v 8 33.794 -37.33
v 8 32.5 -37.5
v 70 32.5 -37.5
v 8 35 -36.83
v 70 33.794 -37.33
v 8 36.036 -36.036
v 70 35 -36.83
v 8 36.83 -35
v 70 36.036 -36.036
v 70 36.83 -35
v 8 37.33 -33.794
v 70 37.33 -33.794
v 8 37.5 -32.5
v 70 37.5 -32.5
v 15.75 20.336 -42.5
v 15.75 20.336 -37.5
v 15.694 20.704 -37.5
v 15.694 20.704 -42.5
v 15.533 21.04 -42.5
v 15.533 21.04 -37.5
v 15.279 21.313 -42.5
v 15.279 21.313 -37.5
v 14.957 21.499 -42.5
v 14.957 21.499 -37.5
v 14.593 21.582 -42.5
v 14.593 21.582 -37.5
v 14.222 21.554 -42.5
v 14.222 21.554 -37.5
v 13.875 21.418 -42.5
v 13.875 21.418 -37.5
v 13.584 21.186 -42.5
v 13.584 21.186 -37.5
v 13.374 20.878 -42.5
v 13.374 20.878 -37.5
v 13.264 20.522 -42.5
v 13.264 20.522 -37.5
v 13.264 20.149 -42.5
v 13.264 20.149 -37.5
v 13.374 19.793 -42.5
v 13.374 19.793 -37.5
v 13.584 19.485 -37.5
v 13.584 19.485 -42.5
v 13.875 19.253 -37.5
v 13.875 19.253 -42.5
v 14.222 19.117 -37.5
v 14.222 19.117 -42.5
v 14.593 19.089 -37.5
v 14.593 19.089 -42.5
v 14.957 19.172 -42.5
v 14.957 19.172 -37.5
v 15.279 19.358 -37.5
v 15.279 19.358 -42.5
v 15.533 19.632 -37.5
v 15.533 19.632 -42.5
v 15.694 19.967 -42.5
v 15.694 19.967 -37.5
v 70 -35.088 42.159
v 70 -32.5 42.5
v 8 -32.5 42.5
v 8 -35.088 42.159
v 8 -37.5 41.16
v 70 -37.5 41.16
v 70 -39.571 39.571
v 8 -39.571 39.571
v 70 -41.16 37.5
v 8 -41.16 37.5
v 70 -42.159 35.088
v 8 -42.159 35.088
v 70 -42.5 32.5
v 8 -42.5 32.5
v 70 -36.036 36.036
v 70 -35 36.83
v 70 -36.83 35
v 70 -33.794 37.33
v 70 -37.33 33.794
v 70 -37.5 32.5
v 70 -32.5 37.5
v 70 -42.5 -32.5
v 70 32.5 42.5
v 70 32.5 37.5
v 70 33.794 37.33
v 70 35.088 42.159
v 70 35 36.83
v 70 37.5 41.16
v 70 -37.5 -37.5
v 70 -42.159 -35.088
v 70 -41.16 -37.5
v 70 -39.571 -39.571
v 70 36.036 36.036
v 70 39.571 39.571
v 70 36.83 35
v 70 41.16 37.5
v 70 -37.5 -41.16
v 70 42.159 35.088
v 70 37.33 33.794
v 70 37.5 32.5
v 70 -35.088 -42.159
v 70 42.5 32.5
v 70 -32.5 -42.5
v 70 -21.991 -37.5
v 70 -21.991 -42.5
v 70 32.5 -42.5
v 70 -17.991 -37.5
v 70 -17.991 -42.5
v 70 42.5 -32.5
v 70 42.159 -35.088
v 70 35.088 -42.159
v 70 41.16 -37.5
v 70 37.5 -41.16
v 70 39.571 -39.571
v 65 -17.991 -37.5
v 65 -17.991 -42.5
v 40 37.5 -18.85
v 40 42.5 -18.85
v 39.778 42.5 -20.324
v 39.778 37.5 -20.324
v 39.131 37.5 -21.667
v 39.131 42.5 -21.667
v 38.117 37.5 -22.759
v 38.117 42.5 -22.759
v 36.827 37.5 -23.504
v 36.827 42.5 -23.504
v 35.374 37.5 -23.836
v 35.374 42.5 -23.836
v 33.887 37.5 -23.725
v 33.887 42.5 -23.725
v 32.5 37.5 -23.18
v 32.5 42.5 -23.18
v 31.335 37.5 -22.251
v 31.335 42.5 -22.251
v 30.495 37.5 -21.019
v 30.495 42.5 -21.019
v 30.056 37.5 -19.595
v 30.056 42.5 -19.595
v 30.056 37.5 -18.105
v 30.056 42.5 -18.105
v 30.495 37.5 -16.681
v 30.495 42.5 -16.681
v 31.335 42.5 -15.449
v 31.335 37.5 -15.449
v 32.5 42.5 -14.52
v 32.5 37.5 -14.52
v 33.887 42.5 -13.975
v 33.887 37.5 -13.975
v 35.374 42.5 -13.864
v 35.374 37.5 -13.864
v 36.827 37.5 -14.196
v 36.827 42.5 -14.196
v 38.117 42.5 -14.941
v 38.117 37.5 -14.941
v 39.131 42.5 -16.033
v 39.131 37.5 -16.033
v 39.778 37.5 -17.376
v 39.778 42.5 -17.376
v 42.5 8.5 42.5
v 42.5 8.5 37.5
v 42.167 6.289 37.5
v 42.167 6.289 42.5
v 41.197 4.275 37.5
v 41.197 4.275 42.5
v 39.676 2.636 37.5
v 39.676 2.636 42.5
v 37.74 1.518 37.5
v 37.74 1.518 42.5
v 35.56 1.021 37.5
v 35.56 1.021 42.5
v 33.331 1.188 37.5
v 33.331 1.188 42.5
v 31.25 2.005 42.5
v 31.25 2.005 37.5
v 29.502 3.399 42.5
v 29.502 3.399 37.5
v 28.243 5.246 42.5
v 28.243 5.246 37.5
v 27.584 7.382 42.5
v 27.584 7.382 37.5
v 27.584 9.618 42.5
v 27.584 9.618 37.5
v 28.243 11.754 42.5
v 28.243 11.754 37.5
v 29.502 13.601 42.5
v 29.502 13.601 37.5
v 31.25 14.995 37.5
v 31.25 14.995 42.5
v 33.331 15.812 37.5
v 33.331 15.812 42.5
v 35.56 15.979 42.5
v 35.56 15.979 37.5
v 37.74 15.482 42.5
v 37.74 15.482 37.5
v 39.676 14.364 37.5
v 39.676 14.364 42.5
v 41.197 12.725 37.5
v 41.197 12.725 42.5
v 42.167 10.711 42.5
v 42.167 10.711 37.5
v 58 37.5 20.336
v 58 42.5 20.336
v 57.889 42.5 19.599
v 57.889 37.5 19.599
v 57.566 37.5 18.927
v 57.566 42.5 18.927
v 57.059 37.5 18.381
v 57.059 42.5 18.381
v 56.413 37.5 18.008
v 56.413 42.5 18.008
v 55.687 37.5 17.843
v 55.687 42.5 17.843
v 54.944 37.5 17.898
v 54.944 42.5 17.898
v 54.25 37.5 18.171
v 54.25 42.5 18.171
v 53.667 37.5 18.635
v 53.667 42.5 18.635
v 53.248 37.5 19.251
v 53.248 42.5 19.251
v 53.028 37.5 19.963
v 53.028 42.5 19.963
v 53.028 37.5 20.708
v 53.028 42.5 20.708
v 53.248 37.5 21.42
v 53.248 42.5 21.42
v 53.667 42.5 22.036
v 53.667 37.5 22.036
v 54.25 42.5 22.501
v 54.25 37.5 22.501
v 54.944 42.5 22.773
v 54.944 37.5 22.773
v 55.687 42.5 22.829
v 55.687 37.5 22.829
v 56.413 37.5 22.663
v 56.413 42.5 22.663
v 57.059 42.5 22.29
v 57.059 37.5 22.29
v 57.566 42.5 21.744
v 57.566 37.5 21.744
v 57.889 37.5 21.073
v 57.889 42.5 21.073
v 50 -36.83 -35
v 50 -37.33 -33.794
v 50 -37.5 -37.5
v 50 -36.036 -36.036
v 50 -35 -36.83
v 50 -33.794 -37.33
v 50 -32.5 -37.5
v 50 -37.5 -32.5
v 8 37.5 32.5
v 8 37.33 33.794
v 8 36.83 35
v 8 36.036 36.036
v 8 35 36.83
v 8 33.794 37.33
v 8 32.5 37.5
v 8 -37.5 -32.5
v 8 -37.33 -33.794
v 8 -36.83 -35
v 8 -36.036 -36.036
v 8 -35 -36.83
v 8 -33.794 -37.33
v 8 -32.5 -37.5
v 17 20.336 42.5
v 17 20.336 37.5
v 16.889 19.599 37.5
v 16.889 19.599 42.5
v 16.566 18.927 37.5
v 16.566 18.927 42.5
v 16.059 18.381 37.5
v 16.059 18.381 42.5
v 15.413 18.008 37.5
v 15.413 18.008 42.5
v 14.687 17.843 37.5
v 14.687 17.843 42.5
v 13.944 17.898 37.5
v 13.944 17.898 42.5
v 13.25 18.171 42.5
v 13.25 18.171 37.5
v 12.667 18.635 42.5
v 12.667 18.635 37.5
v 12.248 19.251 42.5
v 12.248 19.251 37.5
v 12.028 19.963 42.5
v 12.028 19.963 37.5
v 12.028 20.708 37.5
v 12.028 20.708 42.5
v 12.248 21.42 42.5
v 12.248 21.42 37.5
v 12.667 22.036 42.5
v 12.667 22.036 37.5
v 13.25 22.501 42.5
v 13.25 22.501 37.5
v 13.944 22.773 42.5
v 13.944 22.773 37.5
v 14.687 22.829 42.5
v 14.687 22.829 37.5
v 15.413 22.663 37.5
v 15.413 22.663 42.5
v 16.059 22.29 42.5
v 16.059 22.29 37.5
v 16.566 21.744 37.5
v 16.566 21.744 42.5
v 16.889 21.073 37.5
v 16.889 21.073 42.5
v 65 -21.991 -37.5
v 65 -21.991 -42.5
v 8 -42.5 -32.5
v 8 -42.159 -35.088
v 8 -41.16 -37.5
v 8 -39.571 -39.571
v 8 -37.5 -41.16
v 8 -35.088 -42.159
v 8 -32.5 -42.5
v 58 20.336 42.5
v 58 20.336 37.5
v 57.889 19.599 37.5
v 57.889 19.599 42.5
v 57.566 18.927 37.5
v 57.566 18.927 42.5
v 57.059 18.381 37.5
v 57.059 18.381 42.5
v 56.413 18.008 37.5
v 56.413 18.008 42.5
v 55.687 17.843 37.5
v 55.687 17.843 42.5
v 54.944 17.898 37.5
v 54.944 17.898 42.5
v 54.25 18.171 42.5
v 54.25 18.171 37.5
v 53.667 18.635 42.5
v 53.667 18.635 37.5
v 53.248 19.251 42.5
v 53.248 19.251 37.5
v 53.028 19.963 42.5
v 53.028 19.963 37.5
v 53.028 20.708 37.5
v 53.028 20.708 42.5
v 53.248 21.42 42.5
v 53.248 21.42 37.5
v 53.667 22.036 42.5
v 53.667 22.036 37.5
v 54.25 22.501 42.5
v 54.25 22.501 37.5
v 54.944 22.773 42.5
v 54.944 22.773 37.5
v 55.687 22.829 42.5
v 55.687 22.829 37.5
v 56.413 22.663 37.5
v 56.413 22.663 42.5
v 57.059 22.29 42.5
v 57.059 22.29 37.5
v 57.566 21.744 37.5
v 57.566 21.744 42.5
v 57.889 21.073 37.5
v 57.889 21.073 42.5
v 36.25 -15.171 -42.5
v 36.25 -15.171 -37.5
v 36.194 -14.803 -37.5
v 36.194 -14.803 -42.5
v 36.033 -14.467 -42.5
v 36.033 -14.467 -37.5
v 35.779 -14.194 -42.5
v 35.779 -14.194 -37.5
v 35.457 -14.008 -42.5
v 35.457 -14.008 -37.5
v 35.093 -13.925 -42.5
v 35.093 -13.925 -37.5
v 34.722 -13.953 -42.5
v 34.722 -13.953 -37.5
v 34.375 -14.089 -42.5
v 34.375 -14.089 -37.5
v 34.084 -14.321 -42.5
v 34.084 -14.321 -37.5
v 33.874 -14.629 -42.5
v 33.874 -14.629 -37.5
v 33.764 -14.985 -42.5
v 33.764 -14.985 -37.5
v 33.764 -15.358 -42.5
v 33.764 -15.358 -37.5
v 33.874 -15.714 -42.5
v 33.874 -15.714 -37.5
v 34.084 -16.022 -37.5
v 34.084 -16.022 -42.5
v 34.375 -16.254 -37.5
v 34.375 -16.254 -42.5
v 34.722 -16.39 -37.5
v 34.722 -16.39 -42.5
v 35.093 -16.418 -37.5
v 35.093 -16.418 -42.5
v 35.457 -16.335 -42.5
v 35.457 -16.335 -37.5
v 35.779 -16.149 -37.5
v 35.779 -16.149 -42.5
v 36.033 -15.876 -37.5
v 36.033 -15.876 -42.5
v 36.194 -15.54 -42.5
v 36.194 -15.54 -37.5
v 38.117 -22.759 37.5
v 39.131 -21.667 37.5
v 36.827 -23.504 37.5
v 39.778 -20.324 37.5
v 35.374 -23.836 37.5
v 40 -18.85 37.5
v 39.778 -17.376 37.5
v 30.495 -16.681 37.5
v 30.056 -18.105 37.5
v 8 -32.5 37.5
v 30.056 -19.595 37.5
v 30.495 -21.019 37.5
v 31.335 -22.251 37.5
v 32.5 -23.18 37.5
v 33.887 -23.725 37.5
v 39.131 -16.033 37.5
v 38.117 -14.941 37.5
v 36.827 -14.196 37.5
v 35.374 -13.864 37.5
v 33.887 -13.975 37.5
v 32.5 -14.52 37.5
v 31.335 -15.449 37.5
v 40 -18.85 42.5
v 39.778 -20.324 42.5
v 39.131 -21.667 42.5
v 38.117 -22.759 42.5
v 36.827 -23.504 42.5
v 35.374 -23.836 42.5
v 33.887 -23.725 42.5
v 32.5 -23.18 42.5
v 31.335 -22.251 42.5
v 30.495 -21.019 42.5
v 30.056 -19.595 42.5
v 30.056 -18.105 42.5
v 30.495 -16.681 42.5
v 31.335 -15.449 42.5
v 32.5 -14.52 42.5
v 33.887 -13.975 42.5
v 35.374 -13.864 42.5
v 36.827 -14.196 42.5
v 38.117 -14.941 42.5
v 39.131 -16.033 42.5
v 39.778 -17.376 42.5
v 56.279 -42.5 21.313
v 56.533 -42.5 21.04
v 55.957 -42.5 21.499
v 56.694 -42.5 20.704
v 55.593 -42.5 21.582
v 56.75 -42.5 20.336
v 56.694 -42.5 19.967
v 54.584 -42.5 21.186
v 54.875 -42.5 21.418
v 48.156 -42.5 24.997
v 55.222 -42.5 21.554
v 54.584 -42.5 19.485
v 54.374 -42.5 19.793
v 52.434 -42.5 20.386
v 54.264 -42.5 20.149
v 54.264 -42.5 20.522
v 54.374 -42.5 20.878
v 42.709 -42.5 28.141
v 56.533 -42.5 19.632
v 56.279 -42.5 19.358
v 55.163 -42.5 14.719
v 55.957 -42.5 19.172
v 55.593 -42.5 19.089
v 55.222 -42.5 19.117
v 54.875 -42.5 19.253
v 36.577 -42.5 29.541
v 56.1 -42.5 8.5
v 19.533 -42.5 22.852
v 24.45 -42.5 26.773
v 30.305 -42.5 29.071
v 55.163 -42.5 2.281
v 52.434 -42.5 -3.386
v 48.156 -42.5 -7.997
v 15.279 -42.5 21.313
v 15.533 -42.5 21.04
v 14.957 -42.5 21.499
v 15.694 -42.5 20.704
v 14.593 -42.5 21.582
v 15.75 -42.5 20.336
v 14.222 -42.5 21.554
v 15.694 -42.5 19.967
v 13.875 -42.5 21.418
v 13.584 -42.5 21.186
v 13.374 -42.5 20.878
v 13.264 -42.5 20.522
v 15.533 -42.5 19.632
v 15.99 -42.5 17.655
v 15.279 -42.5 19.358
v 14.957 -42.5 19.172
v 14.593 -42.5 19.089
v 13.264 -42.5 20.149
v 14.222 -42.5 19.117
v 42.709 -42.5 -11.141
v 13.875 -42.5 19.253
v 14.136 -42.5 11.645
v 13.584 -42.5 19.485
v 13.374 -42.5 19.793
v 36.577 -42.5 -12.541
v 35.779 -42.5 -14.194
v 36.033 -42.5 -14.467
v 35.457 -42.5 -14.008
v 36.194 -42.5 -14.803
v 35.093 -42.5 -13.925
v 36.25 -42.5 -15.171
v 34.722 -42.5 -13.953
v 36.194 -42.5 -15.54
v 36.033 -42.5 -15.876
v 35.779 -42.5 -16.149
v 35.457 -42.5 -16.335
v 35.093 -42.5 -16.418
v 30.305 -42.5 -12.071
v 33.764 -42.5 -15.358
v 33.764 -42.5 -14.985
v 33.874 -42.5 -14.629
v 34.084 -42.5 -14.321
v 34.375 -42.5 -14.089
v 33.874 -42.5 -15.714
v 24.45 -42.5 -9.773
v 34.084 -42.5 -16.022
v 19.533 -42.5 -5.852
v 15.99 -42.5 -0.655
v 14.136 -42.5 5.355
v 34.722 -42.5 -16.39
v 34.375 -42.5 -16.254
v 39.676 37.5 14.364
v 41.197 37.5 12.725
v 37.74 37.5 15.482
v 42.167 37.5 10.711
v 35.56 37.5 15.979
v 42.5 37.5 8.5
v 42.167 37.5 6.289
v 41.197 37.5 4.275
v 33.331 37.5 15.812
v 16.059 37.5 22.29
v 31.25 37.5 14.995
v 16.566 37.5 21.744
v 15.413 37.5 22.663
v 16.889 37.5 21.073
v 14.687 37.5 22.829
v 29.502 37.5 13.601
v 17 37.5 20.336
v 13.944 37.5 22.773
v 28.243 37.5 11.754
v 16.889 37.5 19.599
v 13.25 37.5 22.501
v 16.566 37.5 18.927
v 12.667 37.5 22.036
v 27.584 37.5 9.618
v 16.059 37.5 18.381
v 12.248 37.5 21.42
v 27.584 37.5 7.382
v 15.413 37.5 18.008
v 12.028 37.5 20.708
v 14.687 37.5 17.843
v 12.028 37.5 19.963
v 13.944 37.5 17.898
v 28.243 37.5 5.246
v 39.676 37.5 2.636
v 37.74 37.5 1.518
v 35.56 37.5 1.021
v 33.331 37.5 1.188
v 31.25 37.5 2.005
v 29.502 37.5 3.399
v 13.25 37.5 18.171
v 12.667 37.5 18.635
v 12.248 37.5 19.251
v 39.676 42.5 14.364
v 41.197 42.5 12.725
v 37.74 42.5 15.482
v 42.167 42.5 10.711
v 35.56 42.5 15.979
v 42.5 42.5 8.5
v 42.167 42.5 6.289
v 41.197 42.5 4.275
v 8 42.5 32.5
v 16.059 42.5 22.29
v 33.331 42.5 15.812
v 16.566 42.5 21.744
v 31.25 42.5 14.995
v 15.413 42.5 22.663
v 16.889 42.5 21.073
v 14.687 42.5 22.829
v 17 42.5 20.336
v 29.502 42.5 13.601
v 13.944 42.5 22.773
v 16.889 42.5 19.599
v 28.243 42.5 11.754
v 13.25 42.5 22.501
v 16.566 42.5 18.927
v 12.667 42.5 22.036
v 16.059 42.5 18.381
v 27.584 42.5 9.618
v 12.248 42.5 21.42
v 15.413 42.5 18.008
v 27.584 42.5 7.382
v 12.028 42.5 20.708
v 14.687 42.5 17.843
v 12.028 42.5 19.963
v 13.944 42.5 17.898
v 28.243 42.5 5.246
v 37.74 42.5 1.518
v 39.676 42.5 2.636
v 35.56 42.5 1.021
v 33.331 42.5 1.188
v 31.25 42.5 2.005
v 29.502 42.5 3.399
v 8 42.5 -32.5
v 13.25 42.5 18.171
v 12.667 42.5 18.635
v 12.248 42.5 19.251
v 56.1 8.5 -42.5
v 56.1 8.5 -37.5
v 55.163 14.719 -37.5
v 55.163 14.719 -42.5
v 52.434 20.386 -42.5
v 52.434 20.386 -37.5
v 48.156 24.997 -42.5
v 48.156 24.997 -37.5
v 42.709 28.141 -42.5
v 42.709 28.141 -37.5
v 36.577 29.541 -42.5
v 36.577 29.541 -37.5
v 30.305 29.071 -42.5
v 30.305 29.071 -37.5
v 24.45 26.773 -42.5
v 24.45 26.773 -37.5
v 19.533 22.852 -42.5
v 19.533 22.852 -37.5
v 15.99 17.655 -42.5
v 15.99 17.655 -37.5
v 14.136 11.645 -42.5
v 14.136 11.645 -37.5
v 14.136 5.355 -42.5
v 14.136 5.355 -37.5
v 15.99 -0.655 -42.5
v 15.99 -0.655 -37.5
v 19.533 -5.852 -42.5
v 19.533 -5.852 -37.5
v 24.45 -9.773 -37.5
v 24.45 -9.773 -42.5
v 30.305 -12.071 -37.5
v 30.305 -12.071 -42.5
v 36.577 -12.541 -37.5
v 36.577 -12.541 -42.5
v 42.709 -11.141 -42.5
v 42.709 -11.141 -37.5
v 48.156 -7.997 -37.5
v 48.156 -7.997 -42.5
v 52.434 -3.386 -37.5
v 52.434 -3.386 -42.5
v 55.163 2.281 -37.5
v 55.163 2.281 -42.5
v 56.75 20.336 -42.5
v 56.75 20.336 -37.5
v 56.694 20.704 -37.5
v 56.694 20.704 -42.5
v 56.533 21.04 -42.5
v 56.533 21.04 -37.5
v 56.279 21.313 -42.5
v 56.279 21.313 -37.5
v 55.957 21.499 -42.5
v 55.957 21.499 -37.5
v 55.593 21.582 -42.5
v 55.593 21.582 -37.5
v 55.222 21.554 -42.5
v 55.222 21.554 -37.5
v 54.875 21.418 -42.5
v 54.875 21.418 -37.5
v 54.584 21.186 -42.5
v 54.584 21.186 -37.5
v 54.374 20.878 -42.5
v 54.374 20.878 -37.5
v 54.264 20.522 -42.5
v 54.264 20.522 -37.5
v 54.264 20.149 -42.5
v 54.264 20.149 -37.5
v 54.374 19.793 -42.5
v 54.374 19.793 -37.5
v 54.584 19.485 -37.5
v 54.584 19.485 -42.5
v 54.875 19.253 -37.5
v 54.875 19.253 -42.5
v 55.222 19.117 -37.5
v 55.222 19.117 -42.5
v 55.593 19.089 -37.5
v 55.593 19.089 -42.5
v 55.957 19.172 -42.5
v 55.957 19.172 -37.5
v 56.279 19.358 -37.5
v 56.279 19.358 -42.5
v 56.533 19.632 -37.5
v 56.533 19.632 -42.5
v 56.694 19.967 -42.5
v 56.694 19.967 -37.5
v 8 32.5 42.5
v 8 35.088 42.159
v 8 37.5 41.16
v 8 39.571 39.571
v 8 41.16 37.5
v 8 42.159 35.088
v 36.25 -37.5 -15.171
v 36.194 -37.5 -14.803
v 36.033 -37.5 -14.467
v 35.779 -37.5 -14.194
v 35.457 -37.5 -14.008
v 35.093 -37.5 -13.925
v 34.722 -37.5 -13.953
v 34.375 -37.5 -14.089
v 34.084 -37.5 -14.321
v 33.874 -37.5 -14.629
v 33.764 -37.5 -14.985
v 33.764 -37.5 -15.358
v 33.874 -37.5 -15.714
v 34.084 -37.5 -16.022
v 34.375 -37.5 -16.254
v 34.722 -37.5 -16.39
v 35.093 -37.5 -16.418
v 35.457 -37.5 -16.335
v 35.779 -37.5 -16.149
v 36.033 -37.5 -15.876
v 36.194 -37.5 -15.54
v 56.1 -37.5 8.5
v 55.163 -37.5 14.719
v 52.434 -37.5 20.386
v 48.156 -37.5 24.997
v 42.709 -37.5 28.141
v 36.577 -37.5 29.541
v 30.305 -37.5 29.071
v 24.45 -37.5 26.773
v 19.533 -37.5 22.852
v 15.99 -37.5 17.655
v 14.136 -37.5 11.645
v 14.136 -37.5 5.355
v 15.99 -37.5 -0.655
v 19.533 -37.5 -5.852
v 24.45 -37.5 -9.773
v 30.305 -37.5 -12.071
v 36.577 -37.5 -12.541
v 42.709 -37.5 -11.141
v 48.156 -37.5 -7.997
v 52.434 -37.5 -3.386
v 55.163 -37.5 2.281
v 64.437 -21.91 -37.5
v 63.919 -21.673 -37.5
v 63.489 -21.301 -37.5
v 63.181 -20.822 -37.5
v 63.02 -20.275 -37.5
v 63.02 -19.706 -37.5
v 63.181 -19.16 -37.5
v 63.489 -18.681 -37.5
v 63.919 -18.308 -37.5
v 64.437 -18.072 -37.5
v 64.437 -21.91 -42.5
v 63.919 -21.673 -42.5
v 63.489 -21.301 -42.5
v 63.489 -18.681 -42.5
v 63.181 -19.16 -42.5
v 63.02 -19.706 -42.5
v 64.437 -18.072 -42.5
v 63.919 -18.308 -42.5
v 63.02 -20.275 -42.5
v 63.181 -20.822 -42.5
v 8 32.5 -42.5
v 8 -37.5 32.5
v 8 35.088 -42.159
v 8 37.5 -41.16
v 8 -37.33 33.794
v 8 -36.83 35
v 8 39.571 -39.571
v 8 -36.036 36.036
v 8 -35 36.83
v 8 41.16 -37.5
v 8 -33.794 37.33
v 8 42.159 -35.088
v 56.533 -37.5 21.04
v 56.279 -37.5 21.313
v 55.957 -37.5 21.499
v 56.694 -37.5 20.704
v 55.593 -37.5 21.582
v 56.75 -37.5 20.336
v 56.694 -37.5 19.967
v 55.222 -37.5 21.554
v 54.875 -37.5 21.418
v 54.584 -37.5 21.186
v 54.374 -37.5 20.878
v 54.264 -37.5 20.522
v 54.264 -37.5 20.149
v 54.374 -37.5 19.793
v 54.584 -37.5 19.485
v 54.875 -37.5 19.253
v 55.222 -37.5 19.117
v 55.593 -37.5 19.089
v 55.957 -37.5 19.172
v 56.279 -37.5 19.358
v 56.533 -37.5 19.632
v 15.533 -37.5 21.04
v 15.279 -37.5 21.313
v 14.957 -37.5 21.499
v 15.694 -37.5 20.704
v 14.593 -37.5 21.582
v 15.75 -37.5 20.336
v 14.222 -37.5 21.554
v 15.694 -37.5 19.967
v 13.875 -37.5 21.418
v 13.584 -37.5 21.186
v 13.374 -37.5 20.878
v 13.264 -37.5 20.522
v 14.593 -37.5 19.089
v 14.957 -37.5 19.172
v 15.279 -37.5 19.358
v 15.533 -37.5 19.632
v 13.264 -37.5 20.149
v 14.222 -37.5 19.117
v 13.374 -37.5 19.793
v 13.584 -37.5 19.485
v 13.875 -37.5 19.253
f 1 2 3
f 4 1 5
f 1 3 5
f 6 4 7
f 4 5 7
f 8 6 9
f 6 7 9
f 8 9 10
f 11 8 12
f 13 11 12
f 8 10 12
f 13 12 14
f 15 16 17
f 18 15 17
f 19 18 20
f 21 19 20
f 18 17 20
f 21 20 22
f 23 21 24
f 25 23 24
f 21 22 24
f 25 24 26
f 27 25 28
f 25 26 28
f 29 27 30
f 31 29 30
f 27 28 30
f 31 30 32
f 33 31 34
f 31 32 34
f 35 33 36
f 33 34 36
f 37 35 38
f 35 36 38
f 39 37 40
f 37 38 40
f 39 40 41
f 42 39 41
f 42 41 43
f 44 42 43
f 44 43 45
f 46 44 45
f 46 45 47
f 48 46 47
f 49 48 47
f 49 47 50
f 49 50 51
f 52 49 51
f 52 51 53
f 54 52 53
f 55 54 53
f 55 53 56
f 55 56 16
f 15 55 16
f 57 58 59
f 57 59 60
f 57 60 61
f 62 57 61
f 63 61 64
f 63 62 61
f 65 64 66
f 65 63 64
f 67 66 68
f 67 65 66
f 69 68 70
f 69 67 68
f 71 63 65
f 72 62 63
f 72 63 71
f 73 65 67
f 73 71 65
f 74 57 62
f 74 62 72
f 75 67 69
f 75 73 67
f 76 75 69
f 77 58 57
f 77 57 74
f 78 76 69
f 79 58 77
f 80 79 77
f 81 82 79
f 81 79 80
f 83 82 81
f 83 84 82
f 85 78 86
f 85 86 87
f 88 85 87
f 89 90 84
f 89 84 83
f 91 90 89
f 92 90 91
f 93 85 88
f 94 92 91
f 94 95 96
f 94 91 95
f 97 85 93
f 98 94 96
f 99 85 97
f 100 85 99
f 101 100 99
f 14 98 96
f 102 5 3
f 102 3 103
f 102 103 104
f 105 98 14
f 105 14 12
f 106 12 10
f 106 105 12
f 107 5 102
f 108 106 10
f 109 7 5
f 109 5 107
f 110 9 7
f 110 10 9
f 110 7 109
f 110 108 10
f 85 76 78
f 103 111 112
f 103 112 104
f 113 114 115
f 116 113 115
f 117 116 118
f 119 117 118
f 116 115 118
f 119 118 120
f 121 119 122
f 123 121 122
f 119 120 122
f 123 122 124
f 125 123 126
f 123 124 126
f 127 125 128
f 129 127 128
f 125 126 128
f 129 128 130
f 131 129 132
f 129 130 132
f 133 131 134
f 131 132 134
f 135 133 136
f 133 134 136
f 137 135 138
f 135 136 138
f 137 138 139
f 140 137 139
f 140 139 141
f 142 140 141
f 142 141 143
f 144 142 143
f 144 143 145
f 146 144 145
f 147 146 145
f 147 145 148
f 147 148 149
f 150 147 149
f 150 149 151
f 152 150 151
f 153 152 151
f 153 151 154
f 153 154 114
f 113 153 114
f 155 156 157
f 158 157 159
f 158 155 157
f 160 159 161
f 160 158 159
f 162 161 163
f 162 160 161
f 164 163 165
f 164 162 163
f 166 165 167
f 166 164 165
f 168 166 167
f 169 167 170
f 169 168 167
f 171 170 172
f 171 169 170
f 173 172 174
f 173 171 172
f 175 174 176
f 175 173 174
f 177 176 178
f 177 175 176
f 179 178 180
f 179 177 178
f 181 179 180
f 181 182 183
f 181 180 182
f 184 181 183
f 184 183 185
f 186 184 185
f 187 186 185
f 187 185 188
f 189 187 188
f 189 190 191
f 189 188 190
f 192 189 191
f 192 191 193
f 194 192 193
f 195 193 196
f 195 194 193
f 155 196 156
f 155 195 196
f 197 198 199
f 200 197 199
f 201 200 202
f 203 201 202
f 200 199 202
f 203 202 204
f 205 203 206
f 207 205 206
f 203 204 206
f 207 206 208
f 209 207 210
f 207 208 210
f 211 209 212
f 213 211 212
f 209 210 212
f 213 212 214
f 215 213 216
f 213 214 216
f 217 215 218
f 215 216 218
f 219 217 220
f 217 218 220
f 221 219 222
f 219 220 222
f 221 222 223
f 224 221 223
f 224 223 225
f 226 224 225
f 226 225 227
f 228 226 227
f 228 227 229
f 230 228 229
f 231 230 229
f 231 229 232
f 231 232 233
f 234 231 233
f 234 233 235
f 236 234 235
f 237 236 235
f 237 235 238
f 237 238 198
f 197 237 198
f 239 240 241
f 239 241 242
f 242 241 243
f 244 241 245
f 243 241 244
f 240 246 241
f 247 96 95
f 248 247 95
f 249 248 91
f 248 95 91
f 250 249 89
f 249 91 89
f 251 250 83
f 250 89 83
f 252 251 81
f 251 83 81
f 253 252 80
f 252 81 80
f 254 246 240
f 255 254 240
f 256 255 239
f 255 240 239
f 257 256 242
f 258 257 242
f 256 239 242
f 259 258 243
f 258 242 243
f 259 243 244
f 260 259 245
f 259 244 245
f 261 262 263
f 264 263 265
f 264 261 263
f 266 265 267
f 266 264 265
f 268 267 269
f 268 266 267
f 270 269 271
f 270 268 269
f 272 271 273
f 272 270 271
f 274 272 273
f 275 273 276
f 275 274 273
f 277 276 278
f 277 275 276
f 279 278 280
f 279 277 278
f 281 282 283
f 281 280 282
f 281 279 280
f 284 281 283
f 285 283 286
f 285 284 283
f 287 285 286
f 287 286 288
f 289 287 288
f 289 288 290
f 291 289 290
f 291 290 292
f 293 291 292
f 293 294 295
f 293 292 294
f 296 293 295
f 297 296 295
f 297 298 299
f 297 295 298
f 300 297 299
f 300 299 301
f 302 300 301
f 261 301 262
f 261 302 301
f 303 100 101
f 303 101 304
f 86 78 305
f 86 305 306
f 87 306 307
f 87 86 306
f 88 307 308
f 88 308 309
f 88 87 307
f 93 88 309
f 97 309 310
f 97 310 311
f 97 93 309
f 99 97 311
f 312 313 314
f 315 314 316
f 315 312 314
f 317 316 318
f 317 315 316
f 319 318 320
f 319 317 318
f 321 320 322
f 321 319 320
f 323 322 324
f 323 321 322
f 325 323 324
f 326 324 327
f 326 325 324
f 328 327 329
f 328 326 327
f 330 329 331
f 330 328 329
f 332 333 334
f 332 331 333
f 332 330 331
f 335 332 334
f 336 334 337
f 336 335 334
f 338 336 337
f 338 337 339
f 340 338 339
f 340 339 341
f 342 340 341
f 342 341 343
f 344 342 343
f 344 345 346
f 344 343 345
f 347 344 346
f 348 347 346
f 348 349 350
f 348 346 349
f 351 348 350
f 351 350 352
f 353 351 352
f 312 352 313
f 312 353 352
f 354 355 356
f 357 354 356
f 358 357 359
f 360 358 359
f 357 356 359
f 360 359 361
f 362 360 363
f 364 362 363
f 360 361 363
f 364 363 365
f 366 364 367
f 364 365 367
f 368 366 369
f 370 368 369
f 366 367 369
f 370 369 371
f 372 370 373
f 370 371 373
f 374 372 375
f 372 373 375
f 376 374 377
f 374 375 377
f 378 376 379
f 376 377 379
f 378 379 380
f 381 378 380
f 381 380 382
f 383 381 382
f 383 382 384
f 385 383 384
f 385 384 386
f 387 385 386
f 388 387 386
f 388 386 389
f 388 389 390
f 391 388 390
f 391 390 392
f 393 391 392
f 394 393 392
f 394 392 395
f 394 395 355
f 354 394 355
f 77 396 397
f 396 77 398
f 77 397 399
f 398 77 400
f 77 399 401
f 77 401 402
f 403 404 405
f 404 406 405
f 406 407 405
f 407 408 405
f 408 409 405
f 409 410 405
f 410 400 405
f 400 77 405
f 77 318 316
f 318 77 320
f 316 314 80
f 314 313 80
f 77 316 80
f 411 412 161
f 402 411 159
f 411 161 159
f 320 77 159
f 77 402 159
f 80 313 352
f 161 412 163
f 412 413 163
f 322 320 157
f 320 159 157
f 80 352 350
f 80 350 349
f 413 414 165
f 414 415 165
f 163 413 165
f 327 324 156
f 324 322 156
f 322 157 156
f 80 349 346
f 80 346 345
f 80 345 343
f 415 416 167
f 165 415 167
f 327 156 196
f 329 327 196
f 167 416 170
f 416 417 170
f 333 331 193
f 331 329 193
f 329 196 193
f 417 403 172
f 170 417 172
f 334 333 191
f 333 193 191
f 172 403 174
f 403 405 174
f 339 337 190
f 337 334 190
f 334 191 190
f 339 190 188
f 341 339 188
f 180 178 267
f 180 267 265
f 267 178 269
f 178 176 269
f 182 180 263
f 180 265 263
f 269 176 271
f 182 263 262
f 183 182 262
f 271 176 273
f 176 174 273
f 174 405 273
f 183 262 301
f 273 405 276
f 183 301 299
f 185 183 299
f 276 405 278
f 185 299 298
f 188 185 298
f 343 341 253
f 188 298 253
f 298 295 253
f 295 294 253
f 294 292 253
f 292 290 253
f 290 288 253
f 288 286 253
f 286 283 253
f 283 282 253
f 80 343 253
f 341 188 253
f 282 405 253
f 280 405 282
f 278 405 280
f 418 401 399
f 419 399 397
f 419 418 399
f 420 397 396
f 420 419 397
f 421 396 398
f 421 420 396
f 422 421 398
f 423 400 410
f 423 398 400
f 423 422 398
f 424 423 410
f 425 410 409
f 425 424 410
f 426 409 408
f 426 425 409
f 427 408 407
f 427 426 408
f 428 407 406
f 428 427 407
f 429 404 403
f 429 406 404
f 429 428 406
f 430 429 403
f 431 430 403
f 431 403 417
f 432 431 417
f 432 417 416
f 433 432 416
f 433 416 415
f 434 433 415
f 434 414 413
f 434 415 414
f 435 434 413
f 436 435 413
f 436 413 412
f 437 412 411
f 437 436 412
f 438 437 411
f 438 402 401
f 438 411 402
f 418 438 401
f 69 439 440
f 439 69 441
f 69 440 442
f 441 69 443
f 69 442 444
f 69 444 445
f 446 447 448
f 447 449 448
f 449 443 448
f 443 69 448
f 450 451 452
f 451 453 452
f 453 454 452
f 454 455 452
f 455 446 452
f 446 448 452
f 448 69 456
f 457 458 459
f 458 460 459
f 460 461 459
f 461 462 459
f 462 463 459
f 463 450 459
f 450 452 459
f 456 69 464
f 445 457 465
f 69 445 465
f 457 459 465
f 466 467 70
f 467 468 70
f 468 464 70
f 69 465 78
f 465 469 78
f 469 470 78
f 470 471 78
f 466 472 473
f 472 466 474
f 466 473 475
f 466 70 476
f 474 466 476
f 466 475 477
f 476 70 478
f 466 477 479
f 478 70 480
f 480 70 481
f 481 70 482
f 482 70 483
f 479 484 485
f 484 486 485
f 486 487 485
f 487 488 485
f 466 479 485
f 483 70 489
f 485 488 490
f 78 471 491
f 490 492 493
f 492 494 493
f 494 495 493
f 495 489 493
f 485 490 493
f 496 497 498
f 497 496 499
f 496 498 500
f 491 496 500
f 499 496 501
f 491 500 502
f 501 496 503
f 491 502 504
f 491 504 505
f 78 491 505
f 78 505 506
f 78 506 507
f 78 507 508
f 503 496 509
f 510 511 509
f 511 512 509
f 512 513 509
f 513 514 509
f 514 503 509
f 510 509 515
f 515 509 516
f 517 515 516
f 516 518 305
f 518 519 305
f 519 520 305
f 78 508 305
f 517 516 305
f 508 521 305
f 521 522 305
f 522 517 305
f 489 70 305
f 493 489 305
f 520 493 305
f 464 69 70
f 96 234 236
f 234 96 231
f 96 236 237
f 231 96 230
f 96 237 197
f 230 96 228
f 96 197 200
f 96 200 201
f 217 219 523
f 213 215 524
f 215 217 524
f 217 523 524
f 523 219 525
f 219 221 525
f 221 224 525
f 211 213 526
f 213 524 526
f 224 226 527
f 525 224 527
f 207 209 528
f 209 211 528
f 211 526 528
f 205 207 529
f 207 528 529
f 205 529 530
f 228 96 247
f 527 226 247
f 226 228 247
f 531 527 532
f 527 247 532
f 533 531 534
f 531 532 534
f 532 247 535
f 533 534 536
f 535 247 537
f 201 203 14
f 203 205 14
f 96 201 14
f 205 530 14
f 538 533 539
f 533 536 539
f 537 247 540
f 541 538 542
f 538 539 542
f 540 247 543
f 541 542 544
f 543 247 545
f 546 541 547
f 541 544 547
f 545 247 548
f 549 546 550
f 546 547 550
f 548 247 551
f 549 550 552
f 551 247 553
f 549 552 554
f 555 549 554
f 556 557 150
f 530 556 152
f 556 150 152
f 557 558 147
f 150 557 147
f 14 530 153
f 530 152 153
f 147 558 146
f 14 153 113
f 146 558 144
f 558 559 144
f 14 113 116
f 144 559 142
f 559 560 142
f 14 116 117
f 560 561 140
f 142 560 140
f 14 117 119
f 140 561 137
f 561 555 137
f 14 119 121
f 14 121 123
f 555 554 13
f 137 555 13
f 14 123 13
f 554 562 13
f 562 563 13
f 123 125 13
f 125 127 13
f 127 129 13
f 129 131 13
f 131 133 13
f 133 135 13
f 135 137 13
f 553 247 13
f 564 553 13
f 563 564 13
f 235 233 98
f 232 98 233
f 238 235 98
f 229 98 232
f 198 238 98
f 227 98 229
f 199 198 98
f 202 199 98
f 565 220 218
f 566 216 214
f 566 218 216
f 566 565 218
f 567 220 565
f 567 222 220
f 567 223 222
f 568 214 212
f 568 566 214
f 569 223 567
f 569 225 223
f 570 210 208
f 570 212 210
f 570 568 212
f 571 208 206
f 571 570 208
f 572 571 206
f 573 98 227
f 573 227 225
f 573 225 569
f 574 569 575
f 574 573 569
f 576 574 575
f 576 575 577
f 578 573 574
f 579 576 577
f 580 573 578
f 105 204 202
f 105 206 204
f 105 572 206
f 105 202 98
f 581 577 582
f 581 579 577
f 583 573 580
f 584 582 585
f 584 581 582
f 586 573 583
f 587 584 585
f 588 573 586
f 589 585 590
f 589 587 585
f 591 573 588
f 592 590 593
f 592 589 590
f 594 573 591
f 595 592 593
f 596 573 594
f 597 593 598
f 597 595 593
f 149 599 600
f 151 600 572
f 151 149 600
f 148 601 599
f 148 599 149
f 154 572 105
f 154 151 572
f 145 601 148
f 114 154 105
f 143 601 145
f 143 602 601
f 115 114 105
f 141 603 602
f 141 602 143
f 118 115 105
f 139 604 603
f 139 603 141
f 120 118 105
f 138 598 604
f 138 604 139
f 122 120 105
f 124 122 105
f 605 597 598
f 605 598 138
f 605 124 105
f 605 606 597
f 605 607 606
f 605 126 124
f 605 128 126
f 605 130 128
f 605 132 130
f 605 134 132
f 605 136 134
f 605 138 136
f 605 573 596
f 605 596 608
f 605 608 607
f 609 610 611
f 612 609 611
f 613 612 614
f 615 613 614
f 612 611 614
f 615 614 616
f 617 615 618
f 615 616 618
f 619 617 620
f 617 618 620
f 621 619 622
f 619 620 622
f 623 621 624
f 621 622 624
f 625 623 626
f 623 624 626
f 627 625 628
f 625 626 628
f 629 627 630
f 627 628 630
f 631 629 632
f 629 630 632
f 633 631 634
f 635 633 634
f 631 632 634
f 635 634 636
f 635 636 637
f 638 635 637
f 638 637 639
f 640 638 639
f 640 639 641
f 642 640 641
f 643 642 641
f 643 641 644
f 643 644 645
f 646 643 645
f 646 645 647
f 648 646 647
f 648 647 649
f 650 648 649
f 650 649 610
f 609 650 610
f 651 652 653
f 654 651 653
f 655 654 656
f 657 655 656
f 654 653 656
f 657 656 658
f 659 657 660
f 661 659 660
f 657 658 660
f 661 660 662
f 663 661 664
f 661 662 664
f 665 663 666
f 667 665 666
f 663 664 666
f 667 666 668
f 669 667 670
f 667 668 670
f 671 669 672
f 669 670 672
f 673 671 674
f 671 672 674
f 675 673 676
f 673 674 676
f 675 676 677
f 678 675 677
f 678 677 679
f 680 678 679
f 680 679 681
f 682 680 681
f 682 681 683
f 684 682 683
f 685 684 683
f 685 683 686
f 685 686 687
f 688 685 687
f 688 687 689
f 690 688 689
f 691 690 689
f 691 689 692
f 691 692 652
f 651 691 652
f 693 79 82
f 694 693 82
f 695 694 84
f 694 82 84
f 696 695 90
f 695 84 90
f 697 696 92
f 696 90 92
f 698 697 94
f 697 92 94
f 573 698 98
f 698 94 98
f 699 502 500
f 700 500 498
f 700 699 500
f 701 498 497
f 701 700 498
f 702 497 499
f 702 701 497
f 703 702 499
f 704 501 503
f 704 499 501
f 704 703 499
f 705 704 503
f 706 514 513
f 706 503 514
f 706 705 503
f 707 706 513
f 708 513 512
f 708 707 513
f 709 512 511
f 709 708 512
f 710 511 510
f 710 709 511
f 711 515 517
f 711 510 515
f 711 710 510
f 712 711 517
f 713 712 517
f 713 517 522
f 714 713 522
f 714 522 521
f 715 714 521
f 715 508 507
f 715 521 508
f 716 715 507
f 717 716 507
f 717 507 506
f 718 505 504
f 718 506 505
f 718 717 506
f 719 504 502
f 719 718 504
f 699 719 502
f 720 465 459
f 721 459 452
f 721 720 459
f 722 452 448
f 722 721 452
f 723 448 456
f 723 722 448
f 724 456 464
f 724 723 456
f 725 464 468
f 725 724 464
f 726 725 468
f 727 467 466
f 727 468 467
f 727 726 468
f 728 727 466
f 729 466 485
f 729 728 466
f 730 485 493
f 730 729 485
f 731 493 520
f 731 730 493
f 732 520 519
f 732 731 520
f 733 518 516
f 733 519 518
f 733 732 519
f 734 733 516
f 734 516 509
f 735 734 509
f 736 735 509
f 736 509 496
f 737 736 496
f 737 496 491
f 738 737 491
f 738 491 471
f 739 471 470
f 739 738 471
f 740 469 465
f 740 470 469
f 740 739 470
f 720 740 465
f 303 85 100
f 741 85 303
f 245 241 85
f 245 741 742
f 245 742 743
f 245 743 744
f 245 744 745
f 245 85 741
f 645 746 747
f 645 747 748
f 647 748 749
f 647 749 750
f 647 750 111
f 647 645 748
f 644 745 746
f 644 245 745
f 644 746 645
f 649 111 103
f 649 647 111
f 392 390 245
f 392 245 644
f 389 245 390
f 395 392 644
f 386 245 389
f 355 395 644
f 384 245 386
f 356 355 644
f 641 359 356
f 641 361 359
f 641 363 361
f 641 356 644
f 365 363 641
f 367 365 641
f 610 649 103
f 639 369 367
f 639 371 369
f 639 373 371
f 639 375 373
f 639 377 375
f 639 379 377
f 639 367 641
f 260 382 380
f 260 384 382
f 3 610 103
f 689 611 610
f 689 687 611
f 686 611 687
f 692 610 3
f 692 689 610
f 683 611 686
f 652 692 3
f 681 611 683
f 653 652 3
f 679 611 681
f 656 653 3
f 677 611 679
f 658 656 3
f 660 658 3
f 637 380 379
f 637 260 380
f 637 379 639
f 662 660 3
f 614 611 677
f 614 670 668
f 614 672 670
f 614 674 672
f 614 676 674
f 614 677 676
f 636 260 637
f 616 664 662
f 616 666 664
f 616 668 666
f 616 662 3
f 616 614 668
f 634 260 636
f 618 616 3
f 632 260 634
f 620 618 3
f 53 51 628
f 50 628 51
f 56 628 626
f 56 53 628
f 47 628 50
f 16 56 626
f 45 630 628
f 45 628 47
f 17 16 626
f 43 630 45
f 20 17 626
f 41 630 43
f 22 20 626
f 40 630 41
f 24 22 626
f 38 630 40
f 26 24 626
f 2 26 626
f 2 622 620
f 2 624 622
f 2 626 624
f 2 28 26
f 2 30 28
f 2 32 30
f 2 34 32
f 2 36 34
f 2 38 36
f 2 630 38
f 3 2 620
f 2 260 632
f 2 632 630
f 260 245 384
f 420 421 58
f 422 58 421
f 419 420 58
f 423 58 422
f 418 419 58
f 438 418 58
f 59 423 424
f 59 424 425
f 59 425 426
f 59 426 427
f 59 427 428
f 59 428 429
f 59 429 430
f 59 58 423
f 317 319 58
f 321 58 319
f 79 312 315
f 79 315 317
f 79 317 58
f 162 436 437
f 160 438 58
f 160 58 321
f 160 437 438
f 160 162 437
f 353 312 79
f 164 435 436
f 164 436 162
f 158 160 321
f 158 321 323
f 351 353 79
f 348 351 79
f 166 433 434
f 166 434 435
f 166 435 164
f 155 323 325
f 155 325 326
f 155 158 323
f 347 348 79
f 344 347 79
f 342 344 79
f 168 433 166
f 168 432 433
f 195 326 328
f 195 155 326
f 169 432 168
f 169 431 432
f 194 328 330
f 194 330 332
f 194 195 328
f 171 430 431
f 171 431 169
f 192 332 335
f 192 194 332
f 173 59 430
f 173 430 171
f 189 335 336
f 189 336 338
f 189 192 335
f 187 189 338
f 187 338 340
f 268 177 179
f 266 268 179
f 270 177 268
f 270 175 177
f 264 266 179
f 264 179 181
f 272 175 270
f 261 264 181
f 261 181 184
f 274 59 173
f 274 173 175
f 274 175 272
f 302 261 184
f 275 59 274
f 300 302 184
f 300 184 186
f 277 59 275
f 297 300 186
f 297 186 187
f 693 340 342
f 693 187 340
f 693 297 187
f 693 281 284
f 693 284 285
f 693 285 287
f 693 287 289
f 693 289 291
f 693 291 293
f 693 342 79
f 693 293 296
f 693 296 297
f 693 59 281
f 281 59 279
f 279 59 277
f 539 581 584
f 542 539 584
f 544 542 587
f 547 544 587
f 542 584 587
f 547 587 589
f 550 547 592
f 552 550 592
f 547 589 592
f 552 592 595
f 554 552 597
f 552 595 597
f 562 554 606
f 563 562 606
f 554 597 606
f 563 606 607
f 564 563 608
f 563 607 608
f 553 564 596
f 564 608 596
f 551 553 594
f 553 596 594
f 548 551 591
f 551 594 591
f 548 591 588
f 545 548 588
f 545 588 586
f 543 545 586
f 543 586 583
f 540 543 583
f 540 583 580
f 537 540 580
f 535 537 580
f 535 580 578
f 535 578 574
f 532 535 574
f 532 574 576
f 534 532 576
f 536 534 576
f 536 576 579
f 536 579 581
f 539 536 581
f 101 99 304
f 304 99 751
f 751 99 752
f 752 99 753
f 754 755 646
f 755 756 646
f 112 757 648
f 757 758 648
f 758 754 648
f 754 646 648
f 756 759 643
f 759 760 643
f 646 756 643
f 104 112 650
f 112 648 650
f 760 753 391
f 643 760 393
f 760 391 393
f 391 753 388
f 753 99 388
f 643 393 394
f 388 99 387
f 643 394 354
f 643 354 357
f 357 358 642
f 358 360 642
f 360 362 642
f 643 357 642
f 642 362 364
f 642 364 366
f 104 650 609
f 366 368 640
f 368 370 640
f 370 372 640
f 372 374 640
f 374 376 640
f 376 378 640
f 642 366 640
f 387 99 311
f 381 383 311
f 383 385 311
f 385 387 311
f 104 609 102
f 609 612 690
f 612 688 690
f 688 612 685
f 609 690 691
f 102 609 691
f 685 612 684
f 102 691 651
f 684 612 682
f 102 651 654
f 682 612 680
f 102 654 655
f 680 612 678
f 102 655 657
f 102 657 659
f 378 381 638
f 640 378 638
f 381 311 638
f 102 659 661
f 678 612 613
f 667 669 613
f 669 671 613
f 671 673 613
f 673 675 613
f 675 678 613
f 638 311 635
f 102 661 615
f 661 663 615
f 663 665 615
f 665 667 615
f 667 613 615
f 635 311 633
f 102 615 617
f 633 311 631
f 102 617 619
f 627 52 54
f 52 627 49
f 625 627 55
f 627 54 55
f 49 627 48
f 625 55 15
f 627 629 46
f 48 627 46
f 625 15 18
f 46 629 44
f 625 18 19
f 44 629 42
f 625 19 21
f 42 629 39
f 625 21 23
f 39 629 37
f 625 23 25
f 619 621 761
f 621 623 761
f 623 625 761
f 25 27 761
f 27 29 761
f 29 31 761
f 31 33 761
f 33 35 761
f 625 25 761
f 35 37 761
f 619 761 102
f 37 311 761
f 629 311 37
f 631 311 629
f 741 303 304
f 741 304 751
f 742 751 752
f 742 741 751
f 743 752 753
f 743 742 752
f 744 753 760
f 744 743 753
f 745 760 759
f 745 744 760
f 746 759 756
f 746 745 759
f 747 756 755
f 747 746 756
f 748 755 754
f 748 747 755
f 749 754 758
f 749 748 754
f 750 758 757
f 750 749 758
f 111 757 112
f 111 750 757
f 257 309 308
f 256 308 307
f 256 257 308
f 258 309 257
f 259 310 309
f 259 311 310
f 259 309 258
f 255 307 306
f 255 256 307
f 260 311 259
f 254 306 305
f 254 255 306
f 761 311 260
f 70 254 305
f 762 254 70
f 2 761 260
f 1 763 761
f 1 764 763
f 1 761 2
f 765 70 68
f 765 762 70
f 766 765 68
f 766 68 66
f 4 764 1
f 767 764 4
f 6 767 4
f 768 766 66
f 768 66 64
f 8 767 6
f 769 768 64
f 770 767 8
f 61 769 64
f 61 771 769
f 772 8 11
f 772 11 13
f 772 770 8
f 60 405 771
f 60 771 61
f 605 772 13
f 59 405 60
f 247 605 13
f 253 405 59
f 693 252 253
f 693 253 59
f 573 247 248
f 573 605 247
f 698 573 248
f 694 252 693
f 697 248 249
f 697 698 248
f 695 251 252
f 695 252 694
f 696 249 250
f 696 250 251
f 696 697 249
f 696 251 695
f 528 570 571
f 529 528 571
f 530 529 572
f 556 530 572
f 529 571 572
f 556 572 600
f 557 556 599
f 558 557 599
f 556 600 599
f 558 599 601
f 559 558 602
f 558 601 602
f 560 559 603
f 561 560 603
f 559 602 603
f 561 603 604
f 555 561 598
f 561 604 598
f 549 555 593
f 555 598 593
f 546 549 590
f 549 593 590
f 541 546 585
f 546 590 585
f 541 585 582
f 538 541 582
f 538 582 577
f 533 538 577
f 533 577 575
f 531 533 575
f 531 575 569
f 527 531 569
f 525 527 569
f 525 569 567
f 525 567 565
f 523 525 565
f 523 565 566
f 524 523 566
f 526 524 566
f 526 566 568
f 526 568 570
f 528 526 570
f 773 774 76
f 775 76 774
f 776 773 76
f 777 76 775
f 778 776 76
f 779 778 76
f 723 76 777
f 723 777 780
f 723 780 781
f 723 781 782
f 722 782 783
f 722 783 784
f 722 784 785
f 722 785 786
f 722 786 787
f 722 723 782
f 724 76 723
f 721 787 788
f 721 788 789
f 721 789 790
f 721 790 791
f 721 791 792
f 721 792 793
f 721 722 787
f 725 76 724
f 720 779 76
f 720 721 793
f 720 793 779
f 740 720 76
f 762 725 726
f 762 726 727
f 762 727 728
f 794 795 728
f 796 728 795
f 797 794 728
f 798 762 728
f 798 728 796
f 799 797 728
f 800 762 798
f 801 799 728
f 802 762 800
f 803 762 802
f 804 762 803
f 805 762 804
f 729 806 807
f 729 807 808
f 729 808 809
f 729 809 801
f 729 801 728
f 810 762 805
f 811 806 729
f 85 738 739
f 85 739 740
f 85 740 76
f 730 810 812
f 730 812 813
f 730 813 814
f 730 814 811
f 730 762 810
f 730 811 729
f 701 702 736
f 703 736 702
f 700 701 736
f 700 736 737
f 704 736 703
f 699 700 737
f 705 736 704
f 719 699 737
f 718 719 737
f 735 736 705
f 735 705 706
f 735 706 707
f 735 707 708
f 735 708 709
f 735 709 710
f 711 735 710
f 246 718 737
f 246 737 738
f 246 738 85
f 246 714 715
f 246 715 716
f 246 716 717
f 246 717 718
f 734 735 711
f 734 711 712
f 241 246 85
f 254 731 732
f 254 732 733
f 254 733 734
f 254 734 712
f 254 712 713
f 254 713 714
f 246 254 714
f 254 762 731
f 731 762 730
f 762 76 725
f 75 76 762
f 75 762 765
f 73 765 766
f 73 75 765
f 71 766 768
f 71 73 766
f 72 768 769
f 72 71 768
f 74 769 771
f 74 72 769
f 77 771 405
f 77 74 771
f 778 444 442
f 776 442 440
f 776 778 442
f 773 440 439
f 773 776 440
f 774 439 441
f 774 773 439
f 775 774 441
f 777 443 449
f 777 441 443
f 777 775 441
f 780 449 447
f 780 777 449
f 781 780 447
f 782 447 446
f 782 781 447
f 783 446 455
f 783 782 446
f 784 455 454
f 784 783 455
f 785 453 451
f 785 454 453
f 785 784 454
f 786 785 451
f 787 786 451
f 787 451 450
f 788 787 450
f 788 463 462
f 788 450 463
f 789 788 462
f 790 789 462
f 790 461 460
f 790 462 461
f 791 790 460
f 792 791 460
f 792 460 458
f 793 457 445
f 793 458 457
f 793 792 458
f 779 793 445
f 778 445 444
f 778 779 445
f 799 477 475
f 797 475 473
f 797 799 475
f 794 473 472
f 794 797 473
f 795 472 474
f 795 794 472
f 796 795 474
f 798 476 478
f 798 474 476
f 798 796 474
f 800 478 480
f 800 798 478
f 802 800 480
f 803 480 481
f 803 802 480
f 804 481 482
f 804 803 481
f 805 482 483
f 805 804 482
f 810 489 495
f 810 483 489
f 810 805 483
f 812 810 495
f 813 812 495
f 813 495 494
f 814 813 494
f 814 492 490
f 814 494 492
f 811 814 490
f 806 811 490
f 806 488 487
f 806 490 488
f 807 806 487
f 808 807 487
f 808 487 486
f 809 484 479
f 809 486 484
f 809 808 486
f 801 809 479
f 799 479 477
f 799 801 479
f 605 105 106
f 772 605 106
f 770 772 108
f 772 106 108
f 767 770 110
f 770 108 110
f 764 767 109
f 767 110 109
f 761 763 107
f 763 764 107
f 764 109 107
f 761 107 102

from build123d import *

# Parameters (mm, degrees)
SKETCH_2_W          = 85
SKETCH_2_H          = 85
SKETCH_2_W_2        = 75
SKETCH_2_H_2        = 75
EXTRUDE_1_DEPTH     = 70
SKETCH_3_R          = 21.1
CUT_EXTRUDE_1_DEPTH = 10
SKETCH_4_R          = 1.25
CUT_EXTRUDE_2_DEPTH = 10
FILLET_1_R          = 5
FILLET_2_R          = 10
SKETCH_5_W          = 97.414855886
SKETCH_5_H          = 125.778371442
CUT_EXTRUDE_3_DEPTH = 8
SKETCH_6_R          = 5
CUT_EXTRUDE_4_DEPTH = 10
SKETCH_13_R         = 7.5
SKETCH_13_R_2       = 2.5
CUT_EXTRUDE_7_DEPTH = 31
SKETCH_15_W         = 20
SKETCH_15_H         = 16
CUT_EXTRUDE_8_DEPTH = 12
CUT_EXTRUDE_9_DEPTH = 12


with BuildPart() as part:
    # 草图2 → 凸台-拉伸1 (new body)
    with BuildSketch(Plane(origin=(0, 0, 0), x_dir=(0, 0, -1), z_dir=(1, 0, 0))):
        Rectangle(SKETCH_2_W, SKETCH_2_H)
        Rectangle(SKETCH_2_W_2, SKETCH_2_H_2, mode=Mode.SUBTRACT)
    extrude(amount=EXTRUDE_1_DEPTH)

    # 草图3 → 切除-拉伸1 (cut)
    with BuildSketch(Plane.XY.offset(-37.5)):
        with Locations((35, 8.5)):
            Circle(SKETCH_3_R)
    cut_extrude_1 = extrude(amount=-CUT_EXTRUDE_1_DEPTH, mode=Mode.SUBTRACT)

    # 草图4 → 切除-拉伸2 (cut)
    with BuildSketch(Plane.XY.offset(-37.5)):
        with Locations((14.5, 20.335680518)):
            Circle(SKETCH_4_R)
        with Locations((35, -15.171361037)):
            Circle(SKETCH_4_R)
        with Locations((55.5, 20.335680518)):
            Circle(SKETCH_4_R)
    cut_extrude_2 = extrude(amount=-CUT_EXTRUDE_2_DEPTH, mode=Mode.SUBTRACT)

    # 镜向1: 切除-拉伸1, 切除-拉伸2 across plane
    add(cut_extrude_1.mirror(Plane(origin=(0, 0, 0), x_dir=(0, 0.7071067811865476, 0.7071067811865475), z_dir=(0, 0.7071067811865475, -0.7071067811865476))), mode=Mode.SUBTRACT)
    add(cut_extrude_2.mirror(Plane(origin=(0, 0, 0), x_dir=(0, 0.7071067811865476, 0.7071067811865475), z_dir=(0, 0.7071067811865475, -0.7071067811865476))), mode=Mode.SUBTRACT)

    # 圆角1
    fillet_1_edges = [part.edges().sort_by_distance(p)[0] for p in [
        (35, 37.5, 37.5),
        (35, -37.5, 37.5),
        (35, -37.5, -37.5),
        (35, 37.5, -37.5),
    ]]
    fillet(fillet_1_edges, radius=FILLET_1_R)

    # 圆角2
    fillet_2_edges = [part.edges().sort_by_distance(p)[0] for p in [
        (35, 42.5, 42.5),
        (35, -42.5, 42.5),
        (35, -42.5, -42.5),
        (35, 42.5, -42.5),
    ]]
    fillet(fillet_2_edges, radius=FILLET_2_R)

    # 草图5 → 切除-拉伸3 (cut)
    with BuildSketch(Plane.ZY):
        Rectangle(SKETCH_5_W, SKETCH_5_H)
    extrude(amount=-CUT_EXTRUDE_3_DEPTH, mode=Mode.SUBTRACT)

    # 草图6 → 切除-拉伸4 (cut)
    with BuildSketch(Plane(origin=(0, 42.5, 0), x_dir=(1, 0, 0), z_dir=(0, 1, 0))):
        with Locations((35, 18.85)):
            Circle(SKETCH_6_R)
    cut_extrude_4 = extrude(amount=-CUT_EXTRUDE_4_DEPTH, mode=Mode.SUBTRACT)

    # 镜向2: 切除-拉伸4 across plane
    add(cut_extrude_4.mirror(Plane(origin=(0, 0, 0), x_dir=(0, 0.7071067811865476, 0.7071067811865475), z_dir=(0, 0.7071067811865475, -0.7071067811865476))), mode=Mode.SUBTRACT)

    # 草图13 → 切除-拉伸7 (cut)
    with BuildSketch(Plane(origin=(0, 42.5, 0), x_dir=(1, 0, 0), z_dir=(0, 1, 0))):
        with Locations((35, -8.5)):
            Circle(SKETCH_13_R)
        with Locations((55.5, -20.335680518)):
            Circle(SKETCH_13_R_2)
        with Locations((14.5, -20.335680518)):
            Circle(SKETCH_13_R_2)
    cut_extrude_7 = extrude(amount=-CUT_EXTRUDE_7_DEPTH, mode=Mode.SUBTRACT)

    # 镜向5: 切除-拉伸7 across plane
    add(cut_extrude_7.mirror(Plane(origin=(0, 0, 0), x_dir=(0, 0.7071067811865476, 0.7071067811865475), z_dir=(0, 0.7071067811865475, -0.7071067811865476))), mode=Mode.SUBTRACT)

    # 草图15 → 切除-拉伸8 (cut)
    with BuildSketch(Plane.XY.offset(-37.5)):
        with Locations((60, -29.5)):
            Rectangle(SKETCH_15_W, SKETCH_15_H)
    extrude(amount=CUT_EXTRUDE_8_DEPTH, mode=Mode.SUBTRACT)

    # 草图16 → 切除-拉伸9 (cut)
    with BuildSketch(Plane.XY.offset(-37.5)):
        with BuildLine():
            Line((65, -17.990833729), (70, -17.990833729))
            ThreePointArc((70, -17.990833729), (72, -19.990833729), (70, -21.990833729))
            Line((70, -21.990833729), (65, -21.990833729))
            ThreePointArc((65, -21.990833729), (63, -19.990833729), (65, -17.990833729))
        make_face()
    extrude(amount=-CUT_EXTRUDE_9_DEPTH, mode=Mode.SUBTRACT)


solid = part.part
